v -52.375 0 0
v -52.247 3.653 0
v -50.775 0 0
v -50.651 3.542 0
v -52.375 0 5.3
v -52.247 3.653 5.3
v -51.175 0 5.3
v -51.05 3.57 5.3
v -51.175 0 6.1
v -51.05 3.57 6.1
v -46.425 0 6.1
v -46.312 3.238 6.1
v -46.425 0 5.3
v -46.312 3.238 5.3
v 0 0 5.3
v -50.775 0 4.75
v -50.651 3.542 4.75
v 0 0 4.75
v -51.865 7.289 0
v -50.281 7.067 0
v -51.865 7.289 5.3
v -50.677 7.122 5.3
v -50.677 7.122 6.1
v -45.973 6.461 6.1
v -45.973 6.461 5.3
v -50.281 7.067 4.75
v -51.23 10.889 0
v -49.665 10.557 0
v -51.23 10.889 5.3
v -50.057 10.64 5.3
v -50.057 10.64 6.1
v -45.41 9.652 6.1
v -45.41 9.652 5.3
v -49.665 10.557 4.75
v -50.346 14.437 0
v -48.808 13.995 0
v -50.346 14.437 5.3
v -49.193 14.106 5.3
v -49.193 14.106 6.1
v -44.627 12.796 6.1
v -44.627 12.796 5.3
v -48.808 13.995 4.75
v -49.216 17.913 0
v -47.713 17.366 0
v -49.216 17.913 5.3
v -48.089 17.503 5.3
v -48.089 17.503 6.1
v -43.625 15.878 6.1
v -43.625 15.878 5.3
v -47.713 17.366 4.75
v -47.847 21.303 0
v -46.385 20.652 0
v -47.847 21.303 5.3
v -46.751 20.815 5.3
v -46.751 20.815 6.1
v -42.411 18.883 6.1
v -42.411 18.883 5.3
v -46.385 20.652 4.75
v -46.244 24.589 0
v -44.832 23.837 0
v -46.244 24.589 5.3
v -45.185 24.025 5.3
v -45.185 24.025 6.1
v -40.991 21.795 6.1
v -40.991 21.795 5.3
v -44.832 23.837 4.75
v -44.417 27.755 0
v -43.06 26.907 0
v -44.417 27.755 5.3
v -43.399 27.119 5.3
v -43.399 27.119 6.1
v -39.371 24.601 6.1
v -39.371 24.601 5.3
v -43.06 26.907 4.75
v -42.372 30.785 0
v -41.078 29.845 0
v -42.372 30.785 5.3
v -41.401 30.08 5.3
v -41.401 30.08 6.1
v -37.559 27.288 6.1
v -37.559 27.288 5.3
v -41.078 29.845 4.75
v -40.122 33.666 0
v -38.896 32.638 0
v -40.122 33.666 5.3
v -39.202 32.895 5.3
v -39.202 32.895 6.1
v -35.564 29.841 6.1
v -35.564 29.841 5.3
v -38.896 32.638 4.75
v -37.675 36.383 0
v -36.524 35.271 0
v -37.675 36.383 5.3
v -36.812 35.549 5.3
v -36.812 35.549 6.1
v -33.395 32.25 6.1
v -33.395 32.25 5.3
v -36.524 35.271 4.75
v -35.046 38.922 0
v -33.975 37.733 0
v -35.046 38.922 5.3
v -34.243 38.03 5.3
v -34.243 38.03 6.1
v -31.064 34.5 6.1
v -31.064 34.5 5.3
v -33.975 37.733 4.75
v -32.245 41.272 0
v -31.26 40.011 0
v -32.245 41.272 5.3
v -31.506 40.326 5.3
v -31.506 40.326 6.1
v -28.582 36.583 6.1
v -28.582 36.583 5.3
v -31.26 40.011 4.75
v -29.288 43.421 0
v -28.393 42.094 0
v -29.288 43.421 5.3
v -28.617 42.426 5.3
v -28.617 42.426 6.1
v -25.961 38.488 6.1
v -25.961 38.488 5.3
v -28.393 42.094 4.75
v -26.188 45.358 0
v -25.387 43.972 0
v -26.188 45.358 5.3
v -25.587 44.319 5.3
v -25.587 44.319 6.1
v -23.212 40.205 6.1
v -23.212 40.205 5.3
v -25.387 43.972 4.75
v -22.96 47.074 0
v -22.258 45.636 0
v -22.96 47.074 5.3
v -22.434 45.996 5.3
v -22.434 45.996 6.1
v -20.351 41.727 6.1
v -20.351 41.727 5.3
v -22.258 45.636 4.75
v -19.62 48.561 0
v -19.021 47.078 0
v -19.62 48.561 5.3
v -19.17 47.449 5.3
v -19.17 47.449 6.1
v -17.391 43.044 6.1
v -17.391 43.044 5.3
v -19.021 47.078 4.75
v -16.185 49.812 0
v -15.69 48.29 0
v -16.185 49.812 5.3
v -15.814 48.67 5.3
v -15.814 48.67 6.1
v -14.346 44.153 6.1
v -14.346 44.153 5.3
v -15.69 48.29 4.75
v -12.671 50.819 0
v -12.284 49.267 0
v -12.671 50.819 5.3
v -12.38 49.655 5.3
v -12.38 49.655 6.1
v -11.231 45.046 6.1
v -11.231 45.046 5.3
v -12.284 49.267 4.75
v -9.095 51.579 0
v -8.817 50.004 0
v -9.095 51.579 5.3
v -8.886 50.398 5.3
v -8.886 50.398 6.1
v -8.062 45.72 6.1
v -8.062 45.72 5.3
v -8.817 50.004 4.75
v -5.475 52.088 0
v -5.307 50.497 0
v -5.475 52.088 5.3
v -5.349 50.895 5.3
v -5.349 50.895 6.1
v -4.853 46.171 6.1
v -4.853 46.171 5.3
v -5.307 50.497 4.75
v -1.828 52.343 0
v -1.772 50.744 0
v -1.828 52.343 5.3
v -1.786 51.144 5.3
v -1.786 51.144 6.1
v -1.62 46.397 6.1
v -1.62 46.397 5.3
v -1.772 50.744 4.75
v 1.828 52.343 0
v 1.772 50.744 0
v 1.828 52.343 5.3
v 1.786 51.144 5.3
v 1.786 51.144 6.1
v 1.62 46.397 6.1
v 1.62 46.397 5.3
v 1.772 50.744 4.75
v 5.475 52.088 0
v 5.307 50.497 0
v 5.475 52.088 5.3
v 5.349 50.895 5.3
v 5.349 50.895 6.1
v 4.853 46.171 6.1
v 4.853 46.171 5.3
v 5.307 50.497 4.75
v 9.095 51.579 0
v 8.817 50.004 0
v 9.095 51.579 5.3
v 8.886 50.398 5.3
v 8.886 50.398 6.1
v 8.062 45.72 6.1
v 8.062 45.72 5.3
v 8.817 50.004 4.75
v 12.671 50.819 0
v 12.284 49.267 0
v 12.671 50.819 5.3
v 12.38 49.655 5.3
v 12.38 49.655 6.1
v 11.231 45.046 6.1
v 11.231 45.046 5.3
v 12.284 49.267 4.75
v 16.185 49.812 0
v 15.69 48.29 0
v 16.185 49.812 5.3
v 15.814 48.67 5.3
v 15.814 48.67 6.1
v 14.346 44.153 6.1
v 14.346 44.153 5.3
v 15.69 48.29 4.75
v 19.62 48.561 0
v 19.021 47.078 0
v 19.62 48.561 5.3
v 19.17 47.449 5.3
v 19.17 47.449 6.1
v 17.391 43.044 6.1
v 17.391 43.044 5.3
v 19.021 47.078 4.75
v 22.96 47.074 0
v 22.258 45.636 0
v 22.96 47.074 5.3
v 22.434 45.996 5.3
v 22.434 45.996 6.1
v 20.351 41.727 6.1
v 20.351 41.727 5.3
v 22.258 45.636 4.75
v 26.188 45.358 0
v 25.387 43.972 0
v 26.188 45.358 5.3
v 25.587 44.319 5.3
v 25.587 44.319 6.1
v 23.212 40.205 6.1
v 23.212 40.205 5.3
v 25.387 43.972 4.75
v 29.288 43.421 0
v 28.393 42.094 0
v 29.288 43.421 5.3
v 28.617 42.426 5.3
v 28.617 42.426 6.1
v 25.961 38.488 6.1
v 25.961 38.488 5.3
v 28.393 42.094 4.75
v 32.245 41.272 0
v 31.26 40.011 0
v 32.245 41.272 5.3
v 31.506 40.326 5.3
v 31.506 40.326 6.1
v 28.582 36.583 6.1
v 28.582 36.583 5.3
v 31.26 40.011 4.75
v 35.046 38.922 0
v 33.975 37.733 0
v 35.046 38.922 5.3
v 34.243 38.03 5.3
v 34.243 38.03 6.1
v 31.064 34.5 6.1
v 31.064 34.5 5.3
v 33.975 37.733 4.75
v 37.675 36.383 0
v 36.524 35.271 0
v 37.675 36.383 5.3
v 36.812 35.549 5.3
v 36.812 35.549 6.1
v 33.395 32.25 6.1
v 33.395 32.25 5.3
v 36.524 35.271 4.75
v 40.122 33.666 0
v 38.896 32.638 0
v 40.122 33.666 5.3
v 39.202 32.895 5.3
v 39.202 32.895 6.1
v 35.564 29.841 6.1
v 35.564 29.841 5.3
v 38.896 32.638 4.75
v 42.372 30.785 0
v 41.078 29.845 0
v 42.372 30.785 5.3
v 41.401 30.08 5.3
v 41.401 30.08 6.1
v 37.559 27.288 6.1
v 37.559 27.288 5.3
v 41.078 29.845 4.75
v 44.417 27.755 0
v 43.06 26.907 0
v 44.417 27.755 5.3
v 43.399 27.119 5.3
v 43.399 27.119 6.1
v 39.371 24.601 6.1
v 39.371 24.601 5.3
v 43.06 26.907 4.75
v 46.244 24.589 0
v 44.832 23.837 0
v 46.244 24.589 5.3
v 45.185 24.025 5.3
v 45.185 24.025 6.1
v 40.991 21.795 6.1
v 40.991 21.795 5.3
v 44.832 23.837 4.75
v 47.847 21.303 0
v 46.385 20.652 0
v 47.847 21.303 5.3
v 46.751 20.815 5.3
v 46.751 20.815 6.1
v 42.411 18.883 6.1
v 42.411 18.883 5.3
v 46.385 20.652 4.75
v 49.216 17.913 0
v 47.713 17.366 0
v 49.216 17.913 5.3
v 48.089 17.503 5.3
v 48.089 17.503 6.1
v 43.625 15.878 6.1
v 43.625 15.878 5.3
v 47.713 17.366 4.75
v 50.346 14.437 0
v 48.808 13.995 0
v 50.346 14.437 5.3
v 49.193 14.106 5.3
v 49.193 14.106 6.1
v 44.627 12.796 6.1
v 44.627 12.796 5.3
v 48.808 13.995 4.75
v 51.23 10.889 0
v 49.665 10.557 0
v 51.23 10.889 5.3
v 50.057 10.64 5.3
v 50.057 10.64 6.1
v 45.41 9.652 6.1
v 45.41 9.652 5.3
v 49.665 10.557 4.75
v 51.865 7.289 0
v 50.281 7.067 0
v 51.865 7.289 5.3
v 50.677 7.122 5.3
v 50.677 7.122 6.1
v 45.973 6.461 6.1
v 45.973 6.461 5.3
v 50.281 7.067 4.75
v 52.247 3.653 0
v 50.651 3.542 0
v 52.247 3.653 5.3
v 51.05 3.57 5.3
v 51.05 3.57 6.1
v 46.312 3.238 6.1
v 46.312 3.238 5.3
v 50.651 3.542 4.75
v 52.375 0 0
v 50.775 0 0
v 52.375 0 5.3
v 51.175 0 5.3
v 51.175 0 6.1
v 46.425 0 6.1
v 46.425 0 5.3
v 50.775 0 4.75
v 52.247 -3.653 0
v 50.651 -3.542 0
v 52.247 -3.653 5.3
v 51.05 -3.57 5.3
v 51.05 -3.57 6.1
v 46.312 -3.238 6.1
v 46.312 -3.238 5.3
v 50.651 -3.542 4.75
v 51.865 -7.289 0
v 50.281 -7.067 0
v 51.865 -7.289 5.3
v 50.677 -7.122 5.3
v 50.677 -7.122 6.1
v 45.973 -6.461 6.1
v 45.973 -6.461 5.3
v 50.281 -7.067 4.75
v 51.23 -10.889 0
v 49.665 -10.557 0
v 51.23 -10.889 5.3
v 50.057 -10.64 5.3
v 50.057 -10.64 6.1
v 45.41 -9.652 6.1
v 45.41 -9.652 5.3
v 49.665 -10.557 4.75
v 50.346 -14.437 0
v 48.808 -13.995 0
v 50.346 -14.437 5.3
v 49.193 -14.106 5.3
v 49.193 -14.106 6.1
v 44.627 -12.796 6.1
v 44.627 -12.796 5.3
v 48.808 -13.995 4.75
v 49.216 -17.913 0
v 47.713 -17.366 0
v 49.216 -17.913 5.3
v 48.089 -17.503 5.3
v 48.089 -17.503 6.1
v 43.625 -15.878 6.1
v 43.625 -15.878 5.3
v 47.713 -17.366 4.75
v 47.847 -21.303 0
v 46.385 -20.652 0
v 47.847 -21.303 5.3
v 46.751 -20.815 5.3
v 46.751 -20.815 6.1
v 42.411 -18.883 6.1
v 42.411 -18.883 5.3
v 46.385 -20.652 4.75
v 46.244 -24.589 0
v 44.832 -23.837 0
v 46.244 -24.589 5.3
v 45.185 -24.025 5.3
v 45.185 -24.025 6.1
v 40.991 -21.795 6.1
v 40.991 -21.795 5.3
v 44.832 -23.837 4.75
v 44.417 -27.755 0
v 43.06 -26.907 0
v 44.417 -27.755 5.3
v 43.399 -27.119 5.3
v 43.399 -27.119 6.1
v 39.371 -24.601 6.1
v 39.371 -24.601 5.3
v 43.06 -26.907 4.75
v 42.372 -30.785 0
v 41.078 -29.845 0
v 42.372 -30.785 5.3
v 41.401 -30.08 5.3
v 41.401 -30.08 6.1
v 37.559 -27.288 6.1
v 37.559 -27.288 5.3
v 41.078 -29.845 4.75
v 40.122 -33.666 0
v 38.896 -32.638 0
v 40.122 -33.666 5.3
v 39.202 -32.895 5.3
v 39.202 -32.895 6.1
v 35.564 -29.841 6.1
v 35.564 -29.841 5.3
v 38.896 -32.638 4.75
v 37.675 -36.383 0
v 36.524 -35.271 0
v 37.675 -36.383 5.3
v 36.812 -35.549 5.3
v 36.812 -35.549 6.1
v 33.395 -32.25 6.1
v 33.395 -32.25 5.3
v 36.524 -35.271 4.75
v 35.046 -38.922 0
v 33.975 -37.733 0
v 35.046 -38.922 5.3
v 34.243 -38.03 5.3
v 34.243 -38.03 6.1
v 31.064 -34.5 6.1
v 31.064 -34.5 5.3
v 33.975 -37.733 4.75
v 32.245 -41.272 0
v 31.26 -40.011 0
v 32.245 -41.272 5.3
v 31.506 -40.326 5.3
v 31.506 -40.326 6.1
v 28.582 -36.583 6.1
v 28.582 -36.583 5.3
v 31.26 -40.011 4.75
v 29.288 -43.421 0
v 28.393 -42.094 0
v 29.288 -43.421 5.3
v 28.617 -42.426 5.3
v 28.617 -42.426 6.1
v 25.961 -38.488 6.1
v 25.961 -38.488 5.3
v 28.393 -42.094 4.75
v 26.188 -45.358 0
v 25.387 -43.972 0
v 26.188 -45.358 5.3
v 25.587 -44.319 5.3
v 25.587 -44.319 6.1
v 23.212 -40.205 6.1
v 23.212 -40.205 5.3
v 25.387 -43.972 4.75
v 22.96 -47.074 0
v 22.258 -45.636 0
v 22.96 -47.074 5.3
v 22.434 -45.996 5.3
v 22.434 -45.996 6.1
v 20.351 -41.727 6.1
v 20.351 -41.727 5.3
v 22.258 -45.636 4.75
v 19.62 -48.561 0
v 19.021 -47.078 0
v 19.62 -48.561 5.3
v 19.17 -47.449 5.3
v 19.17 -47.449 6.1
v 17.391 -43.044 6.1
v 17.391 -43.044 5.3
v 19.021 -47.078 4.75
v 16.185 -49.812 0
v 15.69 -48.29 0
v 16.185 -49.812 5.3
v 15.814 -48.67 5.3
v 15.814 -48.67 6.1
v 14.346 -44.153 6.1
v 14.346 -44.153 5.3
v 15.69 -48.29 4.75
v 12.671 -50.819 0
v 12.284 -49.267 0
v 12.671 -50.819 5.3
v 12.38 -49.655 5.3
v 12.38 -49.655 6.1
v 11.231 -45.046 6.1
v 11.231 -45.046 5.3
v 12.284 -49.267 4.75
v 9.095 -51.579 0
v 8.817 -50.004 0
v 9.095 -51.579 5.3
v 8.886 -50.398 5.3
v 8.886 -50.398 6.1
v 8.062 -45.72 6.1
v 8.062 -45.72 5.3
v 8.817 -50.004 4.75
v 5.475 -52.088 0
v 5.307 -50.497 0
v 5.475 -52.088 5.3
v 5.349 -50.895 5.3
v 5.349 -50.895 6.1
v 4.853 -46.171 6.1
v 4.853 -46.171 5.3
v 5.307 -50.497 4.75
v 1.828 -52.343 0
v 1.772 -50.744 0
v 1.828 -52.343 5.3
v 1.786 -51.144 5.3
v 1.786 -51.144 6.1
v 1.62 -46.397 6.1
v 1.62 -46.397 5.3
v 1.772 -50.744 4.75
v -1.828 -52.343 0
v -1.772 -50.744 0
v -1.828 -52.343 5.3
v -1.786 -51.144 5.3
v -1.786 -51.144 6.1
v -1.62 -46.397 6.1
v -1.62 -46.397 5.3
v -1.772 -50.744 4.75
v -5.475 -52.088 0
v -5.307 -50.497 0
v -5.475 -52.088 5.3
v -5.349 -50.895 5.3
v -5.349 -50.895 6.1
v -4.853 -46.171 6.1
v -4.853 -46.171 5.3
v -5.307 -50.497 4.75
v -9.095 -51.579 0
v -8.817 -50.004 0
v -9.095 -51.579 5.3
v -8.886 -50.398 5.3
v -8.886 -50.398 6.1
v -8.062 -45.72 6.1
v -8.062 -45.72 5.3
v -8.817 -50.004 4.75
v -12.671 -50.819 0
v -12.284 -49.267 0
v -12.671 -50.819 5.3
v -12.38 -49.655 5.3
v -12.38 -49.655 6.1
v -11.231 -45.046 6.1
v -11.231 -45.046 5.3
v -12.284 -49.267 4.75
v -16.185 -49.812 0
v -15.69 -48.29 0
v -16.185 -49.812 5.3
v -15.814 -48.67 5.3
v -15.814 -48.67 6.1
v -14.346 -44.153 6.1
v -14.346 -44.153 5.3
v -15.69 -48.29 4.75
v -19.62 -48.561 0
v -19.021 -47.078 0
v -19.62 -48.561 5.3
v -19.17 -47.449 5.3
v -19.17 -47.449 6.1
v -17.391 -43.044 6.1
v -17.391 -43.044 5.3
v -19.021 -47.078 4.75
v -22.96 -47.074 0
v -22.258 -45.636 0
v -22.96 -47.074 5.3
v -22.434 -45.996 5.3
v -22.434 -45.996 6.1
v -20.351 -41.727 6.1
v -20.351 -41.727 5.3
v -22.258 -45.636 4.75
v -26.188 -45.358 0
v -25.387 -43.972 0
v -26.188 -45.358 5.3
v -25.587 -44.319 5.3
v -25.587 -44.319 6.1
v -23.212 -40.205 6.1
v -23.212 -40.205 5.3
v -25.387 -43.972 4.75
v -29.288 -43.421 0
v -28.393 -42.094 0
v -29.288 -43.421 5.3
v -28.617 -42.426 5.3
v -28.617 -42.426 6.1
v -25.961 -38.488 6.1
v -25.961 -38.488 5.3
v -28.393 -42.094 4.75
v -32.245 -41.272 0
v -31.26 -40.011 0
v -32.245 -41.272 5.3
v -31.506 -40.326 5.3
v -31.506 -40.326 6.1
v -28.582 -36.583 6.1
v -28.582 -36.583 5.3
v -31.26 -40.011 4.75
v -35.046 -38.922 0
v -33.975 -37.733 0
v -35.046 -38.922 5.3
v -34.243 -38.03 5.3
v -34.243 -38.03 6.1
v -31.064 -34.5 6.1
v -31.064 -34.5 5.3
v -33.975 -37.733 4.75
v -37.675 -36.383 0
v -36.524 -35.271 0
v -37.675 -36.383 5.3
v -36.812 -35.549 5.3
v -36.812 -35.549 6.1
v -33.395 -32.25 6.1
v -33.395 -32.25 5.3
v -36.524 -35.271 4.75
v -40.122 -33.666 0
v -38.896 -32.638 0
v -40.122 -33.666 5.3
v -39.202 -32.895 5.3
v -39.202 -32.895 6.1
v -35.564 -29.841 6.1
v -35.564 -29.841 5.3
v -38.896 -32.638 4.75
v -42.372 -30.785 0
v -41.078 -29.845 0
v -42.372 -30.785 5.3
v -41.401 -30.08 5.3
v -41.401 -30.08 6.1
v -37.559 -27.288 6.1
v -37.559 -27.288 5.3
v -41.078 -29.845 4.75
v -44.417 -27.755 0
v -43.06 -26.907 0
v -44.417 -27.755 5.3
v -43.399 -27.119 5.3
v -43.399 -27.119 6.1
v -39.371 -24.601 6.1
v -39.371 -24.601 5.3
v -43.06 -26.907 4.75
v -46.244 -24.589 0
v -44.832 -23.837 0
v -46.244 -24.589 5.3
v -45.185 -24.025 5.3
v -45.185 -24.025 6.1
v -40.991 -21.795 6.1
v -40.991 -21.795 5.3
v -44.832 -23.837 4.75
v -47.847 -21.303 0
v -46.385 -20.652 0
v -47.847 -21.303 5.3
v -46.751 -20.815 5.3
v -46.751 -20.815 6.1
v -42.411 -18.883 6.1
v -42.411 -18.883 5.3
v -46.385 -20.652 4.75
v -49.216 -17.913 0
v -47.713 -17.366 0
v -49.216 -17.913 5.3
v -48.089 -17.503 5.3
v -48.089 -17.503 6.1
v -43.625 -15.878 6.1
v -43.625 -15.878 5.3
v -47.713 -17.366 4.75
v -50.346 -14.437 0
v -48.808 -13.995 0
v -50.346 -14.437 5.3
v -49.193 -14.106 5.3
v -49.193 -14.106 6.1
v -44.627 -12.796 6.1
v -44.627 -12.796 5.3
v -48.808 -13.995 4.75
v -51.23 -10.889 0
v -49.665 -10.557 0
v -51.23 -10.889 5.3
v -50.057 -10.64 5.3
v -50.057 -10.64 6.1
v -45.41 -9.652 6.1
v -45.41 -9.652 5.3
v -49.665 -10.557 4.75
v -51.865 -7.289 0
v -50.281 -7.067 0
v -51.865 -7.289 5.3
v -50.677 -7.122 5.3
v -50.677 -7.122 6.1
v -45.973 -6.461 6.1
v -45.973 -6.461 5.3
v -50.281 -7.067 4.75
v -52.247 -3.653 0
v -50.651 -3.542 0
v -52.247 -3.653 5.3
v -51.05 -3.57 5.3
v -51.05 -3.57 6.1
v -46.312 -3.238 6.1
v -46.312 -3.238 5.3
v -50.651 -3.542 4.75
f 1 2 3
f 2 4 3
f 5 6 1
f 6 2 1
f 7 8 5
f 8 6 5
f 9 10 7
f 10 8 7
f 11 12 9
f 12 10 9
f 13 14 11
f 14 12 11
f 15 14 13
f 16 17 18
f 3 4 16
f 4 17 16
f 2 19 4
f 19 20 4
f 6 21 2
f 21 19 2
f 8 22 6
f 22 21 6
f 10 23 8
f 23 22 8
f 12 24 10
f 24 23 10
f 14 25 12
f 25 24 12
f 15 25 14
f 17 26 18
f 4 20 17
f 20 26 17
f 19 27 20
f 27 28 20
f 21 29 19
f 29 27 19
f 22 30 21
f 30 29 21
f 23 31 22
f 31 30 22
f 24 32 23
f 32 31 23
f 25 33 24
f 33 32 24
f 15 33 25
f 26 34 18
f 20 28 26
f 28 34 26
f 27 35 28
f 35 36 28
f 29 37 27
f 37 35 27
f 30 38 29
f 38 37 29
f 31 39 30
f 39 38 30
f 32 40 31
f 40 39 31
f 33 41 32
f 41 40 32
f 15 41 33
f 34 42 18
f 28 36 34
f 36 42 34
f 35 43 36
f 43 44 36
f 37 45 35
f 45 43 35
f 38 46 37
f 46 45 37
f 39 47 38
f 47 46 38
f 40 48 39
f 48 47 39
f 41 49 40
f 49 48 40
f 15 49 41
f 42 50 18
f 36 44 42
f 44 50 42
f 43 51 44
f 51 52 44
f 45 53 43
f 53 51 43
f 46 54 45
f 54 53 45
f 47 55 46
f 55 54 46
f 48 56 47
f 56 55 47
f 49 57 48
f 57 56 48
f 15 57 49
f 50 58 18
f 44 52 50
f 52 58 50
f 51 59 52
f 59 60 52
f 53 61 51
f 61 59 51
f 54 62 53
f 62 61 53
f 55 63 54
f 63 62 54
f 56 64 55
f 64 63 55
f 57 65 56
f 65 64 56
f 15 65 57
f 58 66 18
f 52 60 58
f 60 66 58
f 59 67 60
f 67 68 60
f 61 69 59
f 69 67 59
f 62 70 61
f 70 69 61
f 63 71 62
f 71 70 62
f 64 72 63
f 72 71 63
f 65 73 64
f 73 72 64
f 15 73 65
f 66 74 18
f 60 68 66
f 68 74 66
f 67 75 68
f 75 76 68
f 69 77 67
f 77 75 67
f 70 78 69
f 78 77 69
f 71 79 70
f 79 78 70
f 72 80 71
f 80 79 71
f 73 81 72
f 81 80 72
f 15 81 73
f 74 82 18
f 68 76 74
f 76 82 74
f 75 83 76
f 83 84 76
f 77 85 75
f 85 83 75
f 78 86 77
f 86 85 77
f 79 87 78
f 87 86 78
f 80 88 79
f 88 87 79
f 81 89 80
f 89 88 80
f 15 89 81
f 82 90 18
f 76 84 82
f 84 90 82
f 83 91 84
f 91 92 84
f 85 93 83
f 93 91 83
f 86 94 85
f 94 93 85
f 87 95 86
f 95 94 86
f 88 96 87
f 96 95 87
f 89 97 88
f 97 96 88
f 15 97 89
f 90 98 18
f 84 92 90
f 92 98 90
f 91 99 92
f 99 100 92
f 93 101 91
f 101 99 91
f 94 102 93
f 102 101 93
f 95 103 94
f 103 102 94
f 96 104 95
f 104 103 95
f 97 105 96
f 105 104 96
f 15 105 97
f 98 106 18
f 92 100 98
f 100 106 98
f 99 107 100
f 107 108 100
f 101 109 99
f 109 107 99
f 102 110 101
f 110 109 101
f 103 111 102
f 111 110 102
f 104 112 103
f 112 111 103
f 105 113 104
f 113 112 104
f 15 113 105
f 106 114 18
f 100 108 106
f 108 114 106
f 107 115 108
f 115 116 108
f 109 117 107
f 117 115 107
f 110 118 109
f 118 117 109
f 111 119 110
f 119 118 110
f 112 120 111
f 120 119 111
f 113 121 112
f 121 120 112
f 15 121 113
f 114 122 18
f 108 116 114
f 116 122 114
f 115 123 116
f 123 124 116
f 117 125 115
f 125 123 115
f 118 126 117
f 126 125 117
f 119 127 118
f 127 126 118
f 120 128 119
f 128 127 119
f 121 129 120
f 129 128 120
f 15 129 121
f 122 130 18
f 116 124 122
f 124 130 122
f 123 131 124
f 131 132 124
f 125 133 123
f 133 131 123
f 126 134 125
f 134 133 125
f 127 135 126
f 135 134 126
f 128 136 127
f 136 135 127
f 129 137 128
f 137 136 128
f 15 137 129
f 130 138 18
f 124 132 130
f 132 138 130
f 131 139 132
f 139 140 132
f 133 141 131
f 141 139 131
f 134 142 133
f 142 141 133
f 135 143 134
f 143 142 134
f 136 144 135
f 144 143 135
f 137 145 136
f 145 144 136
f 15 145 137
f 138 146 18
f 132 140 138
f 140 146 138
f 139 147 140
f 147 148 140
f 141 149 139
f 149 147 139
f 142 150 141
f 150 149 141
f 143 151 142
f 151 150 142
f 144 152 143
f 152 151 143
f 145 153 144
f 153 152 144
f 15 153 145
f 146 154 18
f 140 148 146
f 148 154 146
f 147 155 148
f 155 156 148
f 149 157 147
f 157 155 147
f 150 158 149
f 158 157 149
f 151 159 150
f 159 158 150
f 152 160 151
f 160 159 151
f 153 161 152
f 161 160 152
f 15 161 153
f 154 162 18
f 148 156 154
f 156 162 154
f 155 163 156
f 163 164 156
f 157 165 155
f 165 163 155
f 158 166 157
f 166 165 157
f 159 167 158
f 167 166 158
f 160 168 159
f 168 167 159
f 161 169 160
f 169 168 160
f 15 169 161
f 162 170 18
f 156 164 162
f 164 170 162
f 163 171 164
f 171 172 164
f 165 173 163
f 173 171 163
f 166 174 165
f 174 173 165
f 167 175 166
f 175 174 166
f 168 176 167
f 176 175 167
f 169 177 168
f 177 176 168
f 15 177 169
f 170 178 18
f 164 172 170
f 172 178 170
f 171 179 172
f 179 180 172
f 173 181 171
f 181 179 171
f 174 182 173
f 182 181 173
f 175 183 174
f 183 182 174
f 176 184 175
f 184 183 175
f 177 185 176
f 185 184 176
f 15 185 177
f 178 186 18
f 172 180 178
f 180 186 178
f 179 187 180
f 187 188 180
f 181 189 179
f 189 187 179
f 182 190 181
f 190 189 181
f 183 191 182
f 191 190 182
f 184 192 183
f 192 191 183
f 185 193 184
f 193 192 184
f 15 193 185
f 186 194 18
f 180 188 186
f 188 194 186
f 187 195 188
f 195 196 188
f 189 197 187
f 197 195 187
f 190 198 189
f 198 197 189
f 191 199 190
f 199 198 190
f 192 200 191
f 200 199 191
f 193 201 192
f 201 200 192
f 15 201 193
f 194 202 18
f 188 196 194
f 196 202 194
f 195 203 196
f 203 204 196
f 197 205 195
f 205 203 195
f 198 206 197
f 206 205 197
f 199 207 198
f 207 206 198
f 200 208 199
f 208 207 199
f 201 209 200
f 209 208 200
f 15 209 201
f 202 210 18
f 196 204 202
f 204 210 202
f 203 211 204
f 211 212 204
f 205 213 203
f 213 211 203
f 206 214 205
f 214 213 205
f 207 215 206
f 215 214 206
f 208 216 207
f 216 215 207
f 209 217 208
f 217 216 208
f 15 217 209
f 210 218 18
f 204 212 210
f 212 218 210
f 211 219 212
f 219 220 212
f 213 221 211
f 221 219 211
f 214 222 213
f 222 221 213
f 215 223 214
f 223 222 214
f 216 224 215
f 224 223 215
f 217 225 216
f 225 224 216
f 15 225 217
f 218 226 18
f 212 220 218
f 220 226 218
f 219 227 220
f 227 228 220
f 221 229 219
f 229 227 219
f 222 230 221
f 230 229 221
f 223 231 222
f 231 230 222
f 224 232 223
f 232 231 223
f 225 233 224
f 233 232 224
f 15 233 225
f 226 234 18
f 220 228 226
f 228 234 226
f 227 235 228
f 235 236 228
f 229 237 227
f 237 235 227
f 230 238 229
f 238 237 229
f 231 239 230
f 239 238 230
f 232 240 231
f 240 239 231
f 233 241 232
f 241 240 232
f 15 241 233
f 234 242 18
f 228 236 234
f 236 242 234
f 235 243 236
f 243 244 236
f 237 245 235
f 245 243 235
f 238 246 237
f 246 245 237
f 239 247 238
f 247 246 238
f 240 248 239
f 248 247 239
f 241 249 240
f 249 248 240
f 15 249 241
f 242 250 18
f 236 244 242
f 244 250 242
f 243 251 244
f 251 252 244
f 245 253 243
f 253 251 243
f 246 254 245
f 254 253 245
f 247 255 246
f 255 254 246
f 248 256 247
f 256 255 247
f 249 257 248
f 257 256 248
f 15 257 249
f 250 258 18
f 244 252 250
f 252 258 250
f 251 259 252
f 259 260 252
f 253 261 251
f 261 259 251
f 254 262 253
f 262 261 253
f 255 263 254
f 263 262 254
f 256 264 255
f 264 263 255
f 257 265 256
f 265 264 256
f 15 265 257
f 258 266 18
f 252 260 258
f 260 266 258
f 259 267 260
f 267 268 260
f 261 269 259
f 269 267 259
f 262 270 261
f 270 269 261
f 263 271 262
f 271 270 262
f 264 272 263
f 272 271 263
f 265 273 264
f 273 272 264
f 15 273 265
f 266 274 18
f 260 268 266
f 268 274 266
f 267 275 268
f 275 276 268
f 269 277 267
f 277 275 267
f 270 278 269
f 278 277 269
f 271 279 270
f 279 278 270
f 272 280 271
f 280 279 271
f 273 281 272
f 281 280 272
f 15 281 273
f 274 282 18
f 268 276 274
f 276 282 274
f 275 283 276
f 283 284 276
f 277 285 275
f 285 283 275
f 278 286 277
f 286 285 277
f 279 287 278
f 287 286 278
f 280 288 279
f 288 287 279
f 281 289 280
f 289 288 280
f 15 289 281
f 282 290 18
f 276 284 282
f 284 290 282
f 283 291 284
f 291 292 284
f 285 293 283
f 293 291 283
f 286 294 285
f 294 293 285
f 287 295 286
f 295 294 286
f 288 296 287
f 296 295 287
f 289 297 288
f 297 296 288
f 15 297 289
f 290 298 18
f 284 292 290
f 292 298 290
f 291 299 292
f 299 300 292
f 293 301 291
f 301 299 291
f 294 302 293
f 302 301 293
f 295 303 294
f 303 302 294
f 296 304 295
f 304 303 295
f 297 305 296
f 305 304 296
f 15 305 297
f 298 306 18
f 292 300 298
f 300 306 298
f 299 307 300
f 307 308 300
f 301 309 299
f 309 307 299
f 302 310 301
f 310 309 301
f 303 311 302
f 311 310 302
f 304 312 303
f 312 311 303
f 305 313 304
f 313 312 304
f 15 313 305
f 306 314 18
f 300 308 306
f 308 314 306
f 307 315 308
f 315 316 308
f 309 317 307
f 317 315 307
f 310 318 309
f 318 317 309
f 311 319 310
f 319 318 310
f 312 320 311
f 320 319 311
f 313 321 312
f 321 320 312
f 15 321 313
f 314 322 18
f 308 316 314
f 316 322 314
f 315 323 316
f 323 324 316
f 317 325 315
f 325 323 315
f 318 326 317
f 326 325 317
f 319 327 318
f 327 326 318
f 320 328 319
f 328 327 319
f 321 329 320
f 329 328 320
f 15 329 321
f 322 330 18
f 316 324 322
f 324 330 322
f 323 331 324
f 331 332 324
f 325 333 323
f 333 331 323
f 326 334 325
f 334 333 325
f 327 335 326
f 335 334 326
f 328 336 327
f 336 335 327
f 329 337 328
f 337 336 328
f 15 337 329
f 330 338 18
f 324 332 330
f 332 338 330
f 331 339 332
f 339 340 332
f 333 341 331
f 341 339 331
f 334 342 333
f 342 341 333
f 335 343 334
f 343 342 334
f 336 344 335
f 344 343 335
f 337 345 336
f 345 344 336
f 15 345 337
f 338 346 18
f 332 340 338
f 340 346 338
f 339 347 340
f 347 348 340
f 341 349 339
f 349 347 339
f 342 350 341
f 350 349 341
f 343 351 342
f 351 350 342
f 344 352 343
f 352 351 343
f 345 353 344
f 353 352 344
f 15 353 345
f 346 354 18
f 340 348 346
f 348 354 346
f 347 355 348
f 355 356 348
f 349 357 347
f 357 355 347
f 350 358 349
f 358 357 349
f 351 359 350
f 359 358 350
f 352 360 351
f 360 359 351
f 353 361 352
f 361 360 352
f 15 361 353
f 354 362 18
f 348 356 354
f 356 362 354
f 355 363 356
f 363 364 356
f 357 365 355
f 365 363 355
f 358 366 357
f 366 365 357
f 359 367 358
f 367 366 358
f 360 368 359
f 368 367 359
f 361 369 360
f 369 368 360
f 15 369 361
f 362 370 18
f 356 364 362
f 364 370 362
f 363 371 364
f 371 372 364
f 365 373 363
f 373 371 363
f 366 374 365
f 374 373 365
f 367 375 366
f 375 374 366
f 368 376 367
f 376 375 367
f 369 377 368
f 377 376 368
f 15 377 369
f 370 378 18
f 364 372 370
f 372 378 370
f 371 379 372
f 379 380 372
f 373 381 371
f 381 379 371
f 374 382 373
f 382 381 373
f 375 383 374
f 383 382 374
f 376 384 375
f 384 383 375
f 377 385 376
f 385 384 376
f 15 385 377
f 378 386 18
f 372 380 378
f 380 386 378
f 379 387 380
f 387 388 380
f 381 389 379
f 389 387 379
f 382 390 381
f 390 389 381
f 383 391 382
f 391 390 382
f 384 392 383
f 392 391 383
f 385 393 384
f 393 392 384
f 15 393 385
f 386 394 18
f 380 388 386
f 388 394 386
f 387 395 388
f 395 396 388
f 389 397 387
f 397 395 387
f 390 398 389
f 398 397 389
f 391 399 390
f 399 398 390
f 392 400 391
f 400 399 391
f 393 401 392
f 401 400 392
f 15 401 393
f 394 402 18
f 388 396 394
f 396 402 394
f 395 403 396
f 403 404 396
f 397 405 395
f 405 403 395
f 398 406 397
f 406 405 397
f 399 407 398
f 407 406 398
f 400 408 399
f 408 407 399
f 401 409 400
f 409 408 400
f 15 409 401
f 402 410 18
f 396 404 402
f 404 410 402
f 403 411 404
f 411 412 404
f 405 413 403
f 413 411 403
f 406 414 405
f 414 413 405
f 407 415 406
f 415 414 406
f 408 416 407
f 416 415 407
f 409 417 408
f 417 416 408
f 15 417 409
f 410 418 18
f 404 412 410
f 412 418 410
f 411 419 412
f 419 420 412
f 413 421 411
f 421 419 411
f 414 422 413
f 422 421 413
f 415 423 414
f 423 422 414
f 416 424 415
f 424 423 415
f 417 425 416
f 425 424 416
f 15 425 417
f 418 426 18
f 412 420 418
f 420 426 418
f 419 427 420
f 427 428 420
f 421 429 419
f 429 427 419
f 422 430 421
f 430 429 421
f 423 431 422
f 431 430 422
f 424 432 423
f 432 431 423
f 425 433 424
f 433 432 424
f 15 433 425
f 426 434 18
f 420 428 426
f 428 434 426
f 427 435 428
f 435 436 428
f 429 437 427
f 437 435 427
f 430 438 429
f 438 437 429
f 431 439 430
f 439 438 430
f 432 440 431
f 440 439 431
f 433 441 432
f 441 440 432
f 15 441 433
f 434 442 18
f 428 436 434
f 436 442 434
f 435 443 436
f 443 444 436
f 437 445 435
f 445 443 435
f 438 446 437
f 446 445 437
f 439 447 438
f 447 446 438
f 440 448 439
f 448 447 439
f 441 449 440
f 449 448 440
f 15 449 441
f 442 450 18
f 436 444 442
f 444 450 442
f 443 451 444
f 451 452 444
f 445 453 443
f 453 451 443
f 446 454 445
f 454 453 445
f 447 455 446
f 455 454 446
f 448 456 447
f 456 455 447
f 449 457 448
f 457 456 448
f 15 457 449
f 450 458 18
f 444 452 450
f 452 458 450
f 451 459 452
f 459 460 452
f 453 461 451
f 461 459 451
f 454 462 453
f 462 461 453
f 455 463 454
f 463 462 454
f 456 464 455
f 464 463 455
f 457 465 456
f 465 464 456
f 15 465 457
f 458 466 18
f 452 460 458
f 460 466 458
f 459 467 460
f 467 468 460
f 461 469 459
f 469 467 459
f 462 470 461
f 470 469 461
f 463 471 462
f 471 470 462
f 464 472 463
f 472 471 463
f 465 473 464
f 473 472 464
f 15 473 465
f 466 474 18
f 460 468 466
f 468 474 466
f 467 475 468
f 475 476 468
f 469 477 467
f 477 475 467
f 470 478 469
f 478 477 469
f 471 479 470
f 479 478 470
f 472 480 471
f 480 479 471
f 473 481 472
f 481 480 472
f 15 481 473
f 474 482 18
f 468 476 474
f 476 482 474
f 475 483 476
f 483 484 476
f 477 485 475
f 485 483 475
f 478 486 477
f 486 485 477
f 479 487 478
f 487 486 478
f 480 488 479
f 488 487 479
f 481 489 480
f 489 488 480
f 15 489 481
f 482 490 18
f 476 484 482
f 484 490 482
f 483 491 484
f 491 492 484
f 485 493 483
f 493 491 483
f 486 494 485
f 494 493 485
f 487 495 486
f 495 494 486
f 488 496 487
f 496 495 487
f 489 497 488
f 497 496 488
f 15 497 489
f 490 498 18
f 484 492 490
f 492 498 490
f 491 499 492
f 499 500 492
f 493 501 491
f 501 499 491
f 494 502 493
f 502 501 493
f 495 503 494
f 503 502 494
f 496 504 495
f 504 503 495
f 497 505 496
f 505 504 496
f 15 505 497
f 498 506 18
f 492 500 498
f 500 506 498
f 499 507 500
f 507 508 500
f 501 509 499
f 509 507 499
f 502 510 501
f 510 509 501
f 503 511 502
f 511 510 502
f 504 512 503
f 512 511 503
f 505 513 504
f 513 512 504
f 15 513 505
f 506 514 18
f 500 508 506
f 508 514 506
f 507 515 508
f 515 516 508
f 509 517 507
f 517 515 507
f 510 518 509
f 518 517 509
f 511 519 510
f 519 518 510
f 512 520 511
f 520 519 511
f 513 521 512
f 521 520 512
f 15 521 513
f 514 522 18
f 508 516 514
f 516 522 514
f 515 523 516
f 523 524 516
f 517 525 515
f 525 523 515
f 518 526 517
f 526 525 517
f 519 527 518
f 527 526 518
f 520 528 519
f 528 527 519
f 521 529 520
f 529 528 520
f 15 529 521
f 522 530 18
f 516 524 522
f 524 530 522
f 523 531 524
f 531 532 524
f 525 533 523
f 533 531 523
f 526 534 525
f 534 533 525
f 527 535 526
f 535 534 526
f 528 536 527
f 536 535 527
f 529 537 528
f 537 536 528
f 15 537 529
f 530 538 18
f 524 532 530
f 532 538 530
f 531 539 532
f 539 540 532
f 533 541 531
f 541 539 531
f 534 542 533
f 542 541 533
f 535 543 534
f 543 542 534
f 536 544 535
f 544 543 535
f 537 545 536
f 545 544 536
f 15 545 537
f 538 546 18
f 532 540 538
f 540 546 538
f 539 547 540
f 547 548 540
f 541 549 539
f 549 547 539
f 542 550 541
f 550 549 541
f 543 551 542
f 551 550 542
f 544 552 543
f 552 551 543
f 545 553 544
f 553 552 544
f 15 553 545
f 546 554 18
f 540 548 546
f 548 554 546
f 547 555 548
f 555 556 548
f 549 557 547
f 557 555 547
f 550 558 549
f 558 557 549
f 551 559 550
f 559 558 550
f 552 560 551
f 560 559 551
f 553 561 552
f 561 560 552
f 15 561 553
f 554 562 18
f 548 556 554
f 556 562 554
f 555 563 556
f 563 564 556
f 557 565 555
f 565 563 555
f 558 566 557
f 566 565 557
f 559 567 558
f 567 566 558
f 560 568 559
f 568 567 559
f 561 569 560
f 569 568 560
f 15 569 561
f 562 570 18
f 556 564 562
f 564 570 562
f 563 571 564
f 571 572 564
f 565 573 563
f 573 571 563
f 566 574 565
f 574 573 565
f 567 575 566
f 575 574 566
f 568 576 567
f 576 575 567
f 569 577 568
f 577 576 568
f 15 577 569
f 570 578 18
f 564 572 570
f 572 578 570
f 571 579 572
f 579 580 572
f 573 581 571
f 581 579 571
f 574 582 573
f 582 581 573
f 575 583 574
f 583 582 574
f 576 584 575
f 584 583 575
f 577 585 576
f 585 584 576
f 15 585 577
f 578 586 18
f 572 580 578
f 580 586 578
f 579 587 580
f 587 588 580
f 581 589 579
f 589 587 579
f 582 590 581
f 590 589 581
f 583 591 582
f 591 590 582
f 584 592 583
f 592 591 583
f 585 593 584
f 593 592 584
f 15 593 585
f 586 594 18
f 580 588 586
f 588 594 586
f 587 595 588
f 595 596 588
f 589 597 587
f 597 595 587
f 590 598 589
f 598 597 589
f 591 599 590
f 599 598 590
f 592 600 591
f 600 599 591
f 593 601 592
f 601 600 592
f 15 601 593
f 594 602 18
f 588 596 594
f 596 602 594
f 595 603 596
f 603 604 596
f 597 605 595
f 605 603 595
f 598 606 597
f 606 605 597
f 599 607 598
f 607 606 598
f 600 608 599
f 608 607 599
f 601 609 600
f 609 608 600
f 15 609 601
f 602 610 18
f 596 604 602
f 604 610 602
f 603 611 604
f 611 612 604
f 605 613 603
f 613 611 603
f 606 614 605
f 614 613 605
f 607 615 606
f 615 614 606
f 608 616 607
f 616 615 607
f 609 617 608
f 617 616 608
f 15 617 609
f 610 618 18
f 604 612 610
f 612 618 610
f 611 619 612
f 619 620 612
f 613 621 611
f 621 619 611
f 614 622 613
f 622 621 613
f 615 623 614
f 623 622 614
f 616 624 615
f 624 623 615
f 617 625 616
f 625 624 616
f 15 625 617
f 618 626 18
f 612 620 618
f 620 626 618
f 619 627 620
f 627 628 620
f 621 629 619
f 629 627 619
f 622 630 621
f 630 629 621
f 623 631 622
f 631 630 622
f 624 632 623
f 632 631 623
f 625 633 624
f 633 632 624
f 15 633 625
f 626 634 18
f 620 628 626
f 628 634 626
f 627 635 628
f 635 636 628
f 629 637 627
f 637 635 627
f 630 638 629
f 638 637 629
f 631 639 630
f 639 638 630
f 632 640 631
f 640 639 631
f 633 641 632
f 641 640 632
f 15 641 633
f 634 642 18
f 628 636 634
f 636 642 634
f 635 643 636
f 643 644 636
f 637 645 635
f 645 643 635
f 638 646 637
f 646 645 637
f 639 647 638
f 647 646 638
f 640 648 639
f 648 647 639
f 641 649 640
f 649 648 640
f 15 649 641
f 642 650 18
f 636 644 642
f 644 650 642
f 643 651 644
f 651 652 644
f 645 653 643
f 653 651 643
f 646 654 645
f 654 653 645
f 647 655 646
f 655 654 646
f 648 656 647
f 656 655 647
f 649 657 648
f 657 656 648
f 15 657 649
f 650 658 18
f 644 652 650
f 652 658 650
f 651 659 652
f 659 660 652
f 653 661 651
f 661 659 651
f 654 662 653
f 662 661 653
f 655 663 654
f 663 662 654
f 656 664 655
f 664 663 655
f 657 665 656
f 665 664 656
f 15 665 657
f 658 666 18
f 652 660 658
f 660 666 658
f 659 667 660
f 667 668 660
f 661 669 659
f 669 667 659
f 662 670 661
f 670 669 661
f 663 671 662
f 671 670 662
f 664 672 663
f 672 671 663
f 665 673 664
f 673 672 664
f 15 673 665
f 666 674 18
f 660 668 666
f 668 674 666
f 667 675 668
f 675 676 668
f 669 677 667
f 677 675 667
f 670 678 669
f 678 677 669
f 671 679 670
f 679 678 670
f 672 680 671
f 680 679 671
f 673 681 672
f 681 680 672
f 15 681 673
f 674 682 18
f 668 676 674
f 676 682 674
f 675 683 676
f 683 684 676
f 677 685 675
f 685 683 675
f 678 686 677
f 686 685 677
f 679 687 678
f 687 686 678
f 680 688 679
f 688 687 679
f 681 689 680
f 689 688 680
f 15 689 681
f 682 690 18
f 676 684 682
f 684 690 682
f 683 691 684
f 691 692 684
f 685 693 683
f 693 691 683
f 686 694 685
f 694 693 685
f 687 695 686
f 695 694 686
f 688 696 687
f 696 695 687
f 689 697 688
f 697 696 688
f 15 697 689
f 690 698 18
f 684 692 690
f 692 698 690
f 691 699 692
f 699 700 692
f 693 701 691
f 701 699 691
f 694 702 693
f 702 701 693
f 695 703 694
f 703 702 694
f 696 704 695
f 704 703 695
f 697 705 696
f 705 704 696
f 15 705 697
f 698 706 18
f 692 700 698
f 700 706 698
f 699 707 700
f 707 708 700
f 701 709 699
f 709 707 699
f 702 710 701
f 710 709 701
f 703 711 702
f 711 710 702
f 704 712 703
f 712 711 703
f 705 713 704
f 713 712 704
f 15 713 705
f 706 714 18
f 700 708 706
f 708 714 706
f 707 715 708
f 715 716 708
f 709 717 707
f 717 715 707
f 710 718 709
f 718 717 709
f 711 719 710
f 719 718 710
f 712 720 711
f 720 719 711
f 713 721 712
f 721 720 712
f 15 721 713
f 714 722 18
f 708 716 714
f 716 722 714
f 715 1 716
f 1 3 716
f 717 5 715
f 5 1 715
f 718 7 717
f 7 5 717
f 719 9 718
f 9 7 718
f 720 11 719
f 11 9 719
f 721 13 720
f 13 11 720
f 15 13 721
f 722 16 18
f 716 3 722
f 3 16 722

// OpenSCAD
lid_Diameter = 104.75;
lid_Height = 5.3;

lid_Rim_Width = 1.6;
lid_Rim_Depth = 4.75;

ridge_Distance_From_Edge = 1.2;
ridge_Width = 4.75;
ridge_Height = 6.1;
ridge_Height_Difference = ridge_Height - lid_Height;

indent_depth = 0.8;

$fs = 1;
$fa = 4;
lid_3D();

module lid_3D() {
    
    rotate_extrude() 
    lid_2D();
}

// 2D
module lid_2D() {
    difference() {
        union() {
            square([lid_Diameter/2, lid_Height]);
            
            ridge();
        }
        square([lid_Diameter/2 - lid_Rim_Width, lid_Rim_Depth]);
        indent();
    }
}

module ridge(){
    translate([0, 0])
    square([lid_Diameter/2 - ridge_Distance_From_Edge, ridge_Height]);
};

module indent() {
    translate([0, ridge_Height - indent_depth])
    square([lid_Diameter/2 - ridge_Distance_From_Edge - ridge_Width, ridge_Height]);
};
